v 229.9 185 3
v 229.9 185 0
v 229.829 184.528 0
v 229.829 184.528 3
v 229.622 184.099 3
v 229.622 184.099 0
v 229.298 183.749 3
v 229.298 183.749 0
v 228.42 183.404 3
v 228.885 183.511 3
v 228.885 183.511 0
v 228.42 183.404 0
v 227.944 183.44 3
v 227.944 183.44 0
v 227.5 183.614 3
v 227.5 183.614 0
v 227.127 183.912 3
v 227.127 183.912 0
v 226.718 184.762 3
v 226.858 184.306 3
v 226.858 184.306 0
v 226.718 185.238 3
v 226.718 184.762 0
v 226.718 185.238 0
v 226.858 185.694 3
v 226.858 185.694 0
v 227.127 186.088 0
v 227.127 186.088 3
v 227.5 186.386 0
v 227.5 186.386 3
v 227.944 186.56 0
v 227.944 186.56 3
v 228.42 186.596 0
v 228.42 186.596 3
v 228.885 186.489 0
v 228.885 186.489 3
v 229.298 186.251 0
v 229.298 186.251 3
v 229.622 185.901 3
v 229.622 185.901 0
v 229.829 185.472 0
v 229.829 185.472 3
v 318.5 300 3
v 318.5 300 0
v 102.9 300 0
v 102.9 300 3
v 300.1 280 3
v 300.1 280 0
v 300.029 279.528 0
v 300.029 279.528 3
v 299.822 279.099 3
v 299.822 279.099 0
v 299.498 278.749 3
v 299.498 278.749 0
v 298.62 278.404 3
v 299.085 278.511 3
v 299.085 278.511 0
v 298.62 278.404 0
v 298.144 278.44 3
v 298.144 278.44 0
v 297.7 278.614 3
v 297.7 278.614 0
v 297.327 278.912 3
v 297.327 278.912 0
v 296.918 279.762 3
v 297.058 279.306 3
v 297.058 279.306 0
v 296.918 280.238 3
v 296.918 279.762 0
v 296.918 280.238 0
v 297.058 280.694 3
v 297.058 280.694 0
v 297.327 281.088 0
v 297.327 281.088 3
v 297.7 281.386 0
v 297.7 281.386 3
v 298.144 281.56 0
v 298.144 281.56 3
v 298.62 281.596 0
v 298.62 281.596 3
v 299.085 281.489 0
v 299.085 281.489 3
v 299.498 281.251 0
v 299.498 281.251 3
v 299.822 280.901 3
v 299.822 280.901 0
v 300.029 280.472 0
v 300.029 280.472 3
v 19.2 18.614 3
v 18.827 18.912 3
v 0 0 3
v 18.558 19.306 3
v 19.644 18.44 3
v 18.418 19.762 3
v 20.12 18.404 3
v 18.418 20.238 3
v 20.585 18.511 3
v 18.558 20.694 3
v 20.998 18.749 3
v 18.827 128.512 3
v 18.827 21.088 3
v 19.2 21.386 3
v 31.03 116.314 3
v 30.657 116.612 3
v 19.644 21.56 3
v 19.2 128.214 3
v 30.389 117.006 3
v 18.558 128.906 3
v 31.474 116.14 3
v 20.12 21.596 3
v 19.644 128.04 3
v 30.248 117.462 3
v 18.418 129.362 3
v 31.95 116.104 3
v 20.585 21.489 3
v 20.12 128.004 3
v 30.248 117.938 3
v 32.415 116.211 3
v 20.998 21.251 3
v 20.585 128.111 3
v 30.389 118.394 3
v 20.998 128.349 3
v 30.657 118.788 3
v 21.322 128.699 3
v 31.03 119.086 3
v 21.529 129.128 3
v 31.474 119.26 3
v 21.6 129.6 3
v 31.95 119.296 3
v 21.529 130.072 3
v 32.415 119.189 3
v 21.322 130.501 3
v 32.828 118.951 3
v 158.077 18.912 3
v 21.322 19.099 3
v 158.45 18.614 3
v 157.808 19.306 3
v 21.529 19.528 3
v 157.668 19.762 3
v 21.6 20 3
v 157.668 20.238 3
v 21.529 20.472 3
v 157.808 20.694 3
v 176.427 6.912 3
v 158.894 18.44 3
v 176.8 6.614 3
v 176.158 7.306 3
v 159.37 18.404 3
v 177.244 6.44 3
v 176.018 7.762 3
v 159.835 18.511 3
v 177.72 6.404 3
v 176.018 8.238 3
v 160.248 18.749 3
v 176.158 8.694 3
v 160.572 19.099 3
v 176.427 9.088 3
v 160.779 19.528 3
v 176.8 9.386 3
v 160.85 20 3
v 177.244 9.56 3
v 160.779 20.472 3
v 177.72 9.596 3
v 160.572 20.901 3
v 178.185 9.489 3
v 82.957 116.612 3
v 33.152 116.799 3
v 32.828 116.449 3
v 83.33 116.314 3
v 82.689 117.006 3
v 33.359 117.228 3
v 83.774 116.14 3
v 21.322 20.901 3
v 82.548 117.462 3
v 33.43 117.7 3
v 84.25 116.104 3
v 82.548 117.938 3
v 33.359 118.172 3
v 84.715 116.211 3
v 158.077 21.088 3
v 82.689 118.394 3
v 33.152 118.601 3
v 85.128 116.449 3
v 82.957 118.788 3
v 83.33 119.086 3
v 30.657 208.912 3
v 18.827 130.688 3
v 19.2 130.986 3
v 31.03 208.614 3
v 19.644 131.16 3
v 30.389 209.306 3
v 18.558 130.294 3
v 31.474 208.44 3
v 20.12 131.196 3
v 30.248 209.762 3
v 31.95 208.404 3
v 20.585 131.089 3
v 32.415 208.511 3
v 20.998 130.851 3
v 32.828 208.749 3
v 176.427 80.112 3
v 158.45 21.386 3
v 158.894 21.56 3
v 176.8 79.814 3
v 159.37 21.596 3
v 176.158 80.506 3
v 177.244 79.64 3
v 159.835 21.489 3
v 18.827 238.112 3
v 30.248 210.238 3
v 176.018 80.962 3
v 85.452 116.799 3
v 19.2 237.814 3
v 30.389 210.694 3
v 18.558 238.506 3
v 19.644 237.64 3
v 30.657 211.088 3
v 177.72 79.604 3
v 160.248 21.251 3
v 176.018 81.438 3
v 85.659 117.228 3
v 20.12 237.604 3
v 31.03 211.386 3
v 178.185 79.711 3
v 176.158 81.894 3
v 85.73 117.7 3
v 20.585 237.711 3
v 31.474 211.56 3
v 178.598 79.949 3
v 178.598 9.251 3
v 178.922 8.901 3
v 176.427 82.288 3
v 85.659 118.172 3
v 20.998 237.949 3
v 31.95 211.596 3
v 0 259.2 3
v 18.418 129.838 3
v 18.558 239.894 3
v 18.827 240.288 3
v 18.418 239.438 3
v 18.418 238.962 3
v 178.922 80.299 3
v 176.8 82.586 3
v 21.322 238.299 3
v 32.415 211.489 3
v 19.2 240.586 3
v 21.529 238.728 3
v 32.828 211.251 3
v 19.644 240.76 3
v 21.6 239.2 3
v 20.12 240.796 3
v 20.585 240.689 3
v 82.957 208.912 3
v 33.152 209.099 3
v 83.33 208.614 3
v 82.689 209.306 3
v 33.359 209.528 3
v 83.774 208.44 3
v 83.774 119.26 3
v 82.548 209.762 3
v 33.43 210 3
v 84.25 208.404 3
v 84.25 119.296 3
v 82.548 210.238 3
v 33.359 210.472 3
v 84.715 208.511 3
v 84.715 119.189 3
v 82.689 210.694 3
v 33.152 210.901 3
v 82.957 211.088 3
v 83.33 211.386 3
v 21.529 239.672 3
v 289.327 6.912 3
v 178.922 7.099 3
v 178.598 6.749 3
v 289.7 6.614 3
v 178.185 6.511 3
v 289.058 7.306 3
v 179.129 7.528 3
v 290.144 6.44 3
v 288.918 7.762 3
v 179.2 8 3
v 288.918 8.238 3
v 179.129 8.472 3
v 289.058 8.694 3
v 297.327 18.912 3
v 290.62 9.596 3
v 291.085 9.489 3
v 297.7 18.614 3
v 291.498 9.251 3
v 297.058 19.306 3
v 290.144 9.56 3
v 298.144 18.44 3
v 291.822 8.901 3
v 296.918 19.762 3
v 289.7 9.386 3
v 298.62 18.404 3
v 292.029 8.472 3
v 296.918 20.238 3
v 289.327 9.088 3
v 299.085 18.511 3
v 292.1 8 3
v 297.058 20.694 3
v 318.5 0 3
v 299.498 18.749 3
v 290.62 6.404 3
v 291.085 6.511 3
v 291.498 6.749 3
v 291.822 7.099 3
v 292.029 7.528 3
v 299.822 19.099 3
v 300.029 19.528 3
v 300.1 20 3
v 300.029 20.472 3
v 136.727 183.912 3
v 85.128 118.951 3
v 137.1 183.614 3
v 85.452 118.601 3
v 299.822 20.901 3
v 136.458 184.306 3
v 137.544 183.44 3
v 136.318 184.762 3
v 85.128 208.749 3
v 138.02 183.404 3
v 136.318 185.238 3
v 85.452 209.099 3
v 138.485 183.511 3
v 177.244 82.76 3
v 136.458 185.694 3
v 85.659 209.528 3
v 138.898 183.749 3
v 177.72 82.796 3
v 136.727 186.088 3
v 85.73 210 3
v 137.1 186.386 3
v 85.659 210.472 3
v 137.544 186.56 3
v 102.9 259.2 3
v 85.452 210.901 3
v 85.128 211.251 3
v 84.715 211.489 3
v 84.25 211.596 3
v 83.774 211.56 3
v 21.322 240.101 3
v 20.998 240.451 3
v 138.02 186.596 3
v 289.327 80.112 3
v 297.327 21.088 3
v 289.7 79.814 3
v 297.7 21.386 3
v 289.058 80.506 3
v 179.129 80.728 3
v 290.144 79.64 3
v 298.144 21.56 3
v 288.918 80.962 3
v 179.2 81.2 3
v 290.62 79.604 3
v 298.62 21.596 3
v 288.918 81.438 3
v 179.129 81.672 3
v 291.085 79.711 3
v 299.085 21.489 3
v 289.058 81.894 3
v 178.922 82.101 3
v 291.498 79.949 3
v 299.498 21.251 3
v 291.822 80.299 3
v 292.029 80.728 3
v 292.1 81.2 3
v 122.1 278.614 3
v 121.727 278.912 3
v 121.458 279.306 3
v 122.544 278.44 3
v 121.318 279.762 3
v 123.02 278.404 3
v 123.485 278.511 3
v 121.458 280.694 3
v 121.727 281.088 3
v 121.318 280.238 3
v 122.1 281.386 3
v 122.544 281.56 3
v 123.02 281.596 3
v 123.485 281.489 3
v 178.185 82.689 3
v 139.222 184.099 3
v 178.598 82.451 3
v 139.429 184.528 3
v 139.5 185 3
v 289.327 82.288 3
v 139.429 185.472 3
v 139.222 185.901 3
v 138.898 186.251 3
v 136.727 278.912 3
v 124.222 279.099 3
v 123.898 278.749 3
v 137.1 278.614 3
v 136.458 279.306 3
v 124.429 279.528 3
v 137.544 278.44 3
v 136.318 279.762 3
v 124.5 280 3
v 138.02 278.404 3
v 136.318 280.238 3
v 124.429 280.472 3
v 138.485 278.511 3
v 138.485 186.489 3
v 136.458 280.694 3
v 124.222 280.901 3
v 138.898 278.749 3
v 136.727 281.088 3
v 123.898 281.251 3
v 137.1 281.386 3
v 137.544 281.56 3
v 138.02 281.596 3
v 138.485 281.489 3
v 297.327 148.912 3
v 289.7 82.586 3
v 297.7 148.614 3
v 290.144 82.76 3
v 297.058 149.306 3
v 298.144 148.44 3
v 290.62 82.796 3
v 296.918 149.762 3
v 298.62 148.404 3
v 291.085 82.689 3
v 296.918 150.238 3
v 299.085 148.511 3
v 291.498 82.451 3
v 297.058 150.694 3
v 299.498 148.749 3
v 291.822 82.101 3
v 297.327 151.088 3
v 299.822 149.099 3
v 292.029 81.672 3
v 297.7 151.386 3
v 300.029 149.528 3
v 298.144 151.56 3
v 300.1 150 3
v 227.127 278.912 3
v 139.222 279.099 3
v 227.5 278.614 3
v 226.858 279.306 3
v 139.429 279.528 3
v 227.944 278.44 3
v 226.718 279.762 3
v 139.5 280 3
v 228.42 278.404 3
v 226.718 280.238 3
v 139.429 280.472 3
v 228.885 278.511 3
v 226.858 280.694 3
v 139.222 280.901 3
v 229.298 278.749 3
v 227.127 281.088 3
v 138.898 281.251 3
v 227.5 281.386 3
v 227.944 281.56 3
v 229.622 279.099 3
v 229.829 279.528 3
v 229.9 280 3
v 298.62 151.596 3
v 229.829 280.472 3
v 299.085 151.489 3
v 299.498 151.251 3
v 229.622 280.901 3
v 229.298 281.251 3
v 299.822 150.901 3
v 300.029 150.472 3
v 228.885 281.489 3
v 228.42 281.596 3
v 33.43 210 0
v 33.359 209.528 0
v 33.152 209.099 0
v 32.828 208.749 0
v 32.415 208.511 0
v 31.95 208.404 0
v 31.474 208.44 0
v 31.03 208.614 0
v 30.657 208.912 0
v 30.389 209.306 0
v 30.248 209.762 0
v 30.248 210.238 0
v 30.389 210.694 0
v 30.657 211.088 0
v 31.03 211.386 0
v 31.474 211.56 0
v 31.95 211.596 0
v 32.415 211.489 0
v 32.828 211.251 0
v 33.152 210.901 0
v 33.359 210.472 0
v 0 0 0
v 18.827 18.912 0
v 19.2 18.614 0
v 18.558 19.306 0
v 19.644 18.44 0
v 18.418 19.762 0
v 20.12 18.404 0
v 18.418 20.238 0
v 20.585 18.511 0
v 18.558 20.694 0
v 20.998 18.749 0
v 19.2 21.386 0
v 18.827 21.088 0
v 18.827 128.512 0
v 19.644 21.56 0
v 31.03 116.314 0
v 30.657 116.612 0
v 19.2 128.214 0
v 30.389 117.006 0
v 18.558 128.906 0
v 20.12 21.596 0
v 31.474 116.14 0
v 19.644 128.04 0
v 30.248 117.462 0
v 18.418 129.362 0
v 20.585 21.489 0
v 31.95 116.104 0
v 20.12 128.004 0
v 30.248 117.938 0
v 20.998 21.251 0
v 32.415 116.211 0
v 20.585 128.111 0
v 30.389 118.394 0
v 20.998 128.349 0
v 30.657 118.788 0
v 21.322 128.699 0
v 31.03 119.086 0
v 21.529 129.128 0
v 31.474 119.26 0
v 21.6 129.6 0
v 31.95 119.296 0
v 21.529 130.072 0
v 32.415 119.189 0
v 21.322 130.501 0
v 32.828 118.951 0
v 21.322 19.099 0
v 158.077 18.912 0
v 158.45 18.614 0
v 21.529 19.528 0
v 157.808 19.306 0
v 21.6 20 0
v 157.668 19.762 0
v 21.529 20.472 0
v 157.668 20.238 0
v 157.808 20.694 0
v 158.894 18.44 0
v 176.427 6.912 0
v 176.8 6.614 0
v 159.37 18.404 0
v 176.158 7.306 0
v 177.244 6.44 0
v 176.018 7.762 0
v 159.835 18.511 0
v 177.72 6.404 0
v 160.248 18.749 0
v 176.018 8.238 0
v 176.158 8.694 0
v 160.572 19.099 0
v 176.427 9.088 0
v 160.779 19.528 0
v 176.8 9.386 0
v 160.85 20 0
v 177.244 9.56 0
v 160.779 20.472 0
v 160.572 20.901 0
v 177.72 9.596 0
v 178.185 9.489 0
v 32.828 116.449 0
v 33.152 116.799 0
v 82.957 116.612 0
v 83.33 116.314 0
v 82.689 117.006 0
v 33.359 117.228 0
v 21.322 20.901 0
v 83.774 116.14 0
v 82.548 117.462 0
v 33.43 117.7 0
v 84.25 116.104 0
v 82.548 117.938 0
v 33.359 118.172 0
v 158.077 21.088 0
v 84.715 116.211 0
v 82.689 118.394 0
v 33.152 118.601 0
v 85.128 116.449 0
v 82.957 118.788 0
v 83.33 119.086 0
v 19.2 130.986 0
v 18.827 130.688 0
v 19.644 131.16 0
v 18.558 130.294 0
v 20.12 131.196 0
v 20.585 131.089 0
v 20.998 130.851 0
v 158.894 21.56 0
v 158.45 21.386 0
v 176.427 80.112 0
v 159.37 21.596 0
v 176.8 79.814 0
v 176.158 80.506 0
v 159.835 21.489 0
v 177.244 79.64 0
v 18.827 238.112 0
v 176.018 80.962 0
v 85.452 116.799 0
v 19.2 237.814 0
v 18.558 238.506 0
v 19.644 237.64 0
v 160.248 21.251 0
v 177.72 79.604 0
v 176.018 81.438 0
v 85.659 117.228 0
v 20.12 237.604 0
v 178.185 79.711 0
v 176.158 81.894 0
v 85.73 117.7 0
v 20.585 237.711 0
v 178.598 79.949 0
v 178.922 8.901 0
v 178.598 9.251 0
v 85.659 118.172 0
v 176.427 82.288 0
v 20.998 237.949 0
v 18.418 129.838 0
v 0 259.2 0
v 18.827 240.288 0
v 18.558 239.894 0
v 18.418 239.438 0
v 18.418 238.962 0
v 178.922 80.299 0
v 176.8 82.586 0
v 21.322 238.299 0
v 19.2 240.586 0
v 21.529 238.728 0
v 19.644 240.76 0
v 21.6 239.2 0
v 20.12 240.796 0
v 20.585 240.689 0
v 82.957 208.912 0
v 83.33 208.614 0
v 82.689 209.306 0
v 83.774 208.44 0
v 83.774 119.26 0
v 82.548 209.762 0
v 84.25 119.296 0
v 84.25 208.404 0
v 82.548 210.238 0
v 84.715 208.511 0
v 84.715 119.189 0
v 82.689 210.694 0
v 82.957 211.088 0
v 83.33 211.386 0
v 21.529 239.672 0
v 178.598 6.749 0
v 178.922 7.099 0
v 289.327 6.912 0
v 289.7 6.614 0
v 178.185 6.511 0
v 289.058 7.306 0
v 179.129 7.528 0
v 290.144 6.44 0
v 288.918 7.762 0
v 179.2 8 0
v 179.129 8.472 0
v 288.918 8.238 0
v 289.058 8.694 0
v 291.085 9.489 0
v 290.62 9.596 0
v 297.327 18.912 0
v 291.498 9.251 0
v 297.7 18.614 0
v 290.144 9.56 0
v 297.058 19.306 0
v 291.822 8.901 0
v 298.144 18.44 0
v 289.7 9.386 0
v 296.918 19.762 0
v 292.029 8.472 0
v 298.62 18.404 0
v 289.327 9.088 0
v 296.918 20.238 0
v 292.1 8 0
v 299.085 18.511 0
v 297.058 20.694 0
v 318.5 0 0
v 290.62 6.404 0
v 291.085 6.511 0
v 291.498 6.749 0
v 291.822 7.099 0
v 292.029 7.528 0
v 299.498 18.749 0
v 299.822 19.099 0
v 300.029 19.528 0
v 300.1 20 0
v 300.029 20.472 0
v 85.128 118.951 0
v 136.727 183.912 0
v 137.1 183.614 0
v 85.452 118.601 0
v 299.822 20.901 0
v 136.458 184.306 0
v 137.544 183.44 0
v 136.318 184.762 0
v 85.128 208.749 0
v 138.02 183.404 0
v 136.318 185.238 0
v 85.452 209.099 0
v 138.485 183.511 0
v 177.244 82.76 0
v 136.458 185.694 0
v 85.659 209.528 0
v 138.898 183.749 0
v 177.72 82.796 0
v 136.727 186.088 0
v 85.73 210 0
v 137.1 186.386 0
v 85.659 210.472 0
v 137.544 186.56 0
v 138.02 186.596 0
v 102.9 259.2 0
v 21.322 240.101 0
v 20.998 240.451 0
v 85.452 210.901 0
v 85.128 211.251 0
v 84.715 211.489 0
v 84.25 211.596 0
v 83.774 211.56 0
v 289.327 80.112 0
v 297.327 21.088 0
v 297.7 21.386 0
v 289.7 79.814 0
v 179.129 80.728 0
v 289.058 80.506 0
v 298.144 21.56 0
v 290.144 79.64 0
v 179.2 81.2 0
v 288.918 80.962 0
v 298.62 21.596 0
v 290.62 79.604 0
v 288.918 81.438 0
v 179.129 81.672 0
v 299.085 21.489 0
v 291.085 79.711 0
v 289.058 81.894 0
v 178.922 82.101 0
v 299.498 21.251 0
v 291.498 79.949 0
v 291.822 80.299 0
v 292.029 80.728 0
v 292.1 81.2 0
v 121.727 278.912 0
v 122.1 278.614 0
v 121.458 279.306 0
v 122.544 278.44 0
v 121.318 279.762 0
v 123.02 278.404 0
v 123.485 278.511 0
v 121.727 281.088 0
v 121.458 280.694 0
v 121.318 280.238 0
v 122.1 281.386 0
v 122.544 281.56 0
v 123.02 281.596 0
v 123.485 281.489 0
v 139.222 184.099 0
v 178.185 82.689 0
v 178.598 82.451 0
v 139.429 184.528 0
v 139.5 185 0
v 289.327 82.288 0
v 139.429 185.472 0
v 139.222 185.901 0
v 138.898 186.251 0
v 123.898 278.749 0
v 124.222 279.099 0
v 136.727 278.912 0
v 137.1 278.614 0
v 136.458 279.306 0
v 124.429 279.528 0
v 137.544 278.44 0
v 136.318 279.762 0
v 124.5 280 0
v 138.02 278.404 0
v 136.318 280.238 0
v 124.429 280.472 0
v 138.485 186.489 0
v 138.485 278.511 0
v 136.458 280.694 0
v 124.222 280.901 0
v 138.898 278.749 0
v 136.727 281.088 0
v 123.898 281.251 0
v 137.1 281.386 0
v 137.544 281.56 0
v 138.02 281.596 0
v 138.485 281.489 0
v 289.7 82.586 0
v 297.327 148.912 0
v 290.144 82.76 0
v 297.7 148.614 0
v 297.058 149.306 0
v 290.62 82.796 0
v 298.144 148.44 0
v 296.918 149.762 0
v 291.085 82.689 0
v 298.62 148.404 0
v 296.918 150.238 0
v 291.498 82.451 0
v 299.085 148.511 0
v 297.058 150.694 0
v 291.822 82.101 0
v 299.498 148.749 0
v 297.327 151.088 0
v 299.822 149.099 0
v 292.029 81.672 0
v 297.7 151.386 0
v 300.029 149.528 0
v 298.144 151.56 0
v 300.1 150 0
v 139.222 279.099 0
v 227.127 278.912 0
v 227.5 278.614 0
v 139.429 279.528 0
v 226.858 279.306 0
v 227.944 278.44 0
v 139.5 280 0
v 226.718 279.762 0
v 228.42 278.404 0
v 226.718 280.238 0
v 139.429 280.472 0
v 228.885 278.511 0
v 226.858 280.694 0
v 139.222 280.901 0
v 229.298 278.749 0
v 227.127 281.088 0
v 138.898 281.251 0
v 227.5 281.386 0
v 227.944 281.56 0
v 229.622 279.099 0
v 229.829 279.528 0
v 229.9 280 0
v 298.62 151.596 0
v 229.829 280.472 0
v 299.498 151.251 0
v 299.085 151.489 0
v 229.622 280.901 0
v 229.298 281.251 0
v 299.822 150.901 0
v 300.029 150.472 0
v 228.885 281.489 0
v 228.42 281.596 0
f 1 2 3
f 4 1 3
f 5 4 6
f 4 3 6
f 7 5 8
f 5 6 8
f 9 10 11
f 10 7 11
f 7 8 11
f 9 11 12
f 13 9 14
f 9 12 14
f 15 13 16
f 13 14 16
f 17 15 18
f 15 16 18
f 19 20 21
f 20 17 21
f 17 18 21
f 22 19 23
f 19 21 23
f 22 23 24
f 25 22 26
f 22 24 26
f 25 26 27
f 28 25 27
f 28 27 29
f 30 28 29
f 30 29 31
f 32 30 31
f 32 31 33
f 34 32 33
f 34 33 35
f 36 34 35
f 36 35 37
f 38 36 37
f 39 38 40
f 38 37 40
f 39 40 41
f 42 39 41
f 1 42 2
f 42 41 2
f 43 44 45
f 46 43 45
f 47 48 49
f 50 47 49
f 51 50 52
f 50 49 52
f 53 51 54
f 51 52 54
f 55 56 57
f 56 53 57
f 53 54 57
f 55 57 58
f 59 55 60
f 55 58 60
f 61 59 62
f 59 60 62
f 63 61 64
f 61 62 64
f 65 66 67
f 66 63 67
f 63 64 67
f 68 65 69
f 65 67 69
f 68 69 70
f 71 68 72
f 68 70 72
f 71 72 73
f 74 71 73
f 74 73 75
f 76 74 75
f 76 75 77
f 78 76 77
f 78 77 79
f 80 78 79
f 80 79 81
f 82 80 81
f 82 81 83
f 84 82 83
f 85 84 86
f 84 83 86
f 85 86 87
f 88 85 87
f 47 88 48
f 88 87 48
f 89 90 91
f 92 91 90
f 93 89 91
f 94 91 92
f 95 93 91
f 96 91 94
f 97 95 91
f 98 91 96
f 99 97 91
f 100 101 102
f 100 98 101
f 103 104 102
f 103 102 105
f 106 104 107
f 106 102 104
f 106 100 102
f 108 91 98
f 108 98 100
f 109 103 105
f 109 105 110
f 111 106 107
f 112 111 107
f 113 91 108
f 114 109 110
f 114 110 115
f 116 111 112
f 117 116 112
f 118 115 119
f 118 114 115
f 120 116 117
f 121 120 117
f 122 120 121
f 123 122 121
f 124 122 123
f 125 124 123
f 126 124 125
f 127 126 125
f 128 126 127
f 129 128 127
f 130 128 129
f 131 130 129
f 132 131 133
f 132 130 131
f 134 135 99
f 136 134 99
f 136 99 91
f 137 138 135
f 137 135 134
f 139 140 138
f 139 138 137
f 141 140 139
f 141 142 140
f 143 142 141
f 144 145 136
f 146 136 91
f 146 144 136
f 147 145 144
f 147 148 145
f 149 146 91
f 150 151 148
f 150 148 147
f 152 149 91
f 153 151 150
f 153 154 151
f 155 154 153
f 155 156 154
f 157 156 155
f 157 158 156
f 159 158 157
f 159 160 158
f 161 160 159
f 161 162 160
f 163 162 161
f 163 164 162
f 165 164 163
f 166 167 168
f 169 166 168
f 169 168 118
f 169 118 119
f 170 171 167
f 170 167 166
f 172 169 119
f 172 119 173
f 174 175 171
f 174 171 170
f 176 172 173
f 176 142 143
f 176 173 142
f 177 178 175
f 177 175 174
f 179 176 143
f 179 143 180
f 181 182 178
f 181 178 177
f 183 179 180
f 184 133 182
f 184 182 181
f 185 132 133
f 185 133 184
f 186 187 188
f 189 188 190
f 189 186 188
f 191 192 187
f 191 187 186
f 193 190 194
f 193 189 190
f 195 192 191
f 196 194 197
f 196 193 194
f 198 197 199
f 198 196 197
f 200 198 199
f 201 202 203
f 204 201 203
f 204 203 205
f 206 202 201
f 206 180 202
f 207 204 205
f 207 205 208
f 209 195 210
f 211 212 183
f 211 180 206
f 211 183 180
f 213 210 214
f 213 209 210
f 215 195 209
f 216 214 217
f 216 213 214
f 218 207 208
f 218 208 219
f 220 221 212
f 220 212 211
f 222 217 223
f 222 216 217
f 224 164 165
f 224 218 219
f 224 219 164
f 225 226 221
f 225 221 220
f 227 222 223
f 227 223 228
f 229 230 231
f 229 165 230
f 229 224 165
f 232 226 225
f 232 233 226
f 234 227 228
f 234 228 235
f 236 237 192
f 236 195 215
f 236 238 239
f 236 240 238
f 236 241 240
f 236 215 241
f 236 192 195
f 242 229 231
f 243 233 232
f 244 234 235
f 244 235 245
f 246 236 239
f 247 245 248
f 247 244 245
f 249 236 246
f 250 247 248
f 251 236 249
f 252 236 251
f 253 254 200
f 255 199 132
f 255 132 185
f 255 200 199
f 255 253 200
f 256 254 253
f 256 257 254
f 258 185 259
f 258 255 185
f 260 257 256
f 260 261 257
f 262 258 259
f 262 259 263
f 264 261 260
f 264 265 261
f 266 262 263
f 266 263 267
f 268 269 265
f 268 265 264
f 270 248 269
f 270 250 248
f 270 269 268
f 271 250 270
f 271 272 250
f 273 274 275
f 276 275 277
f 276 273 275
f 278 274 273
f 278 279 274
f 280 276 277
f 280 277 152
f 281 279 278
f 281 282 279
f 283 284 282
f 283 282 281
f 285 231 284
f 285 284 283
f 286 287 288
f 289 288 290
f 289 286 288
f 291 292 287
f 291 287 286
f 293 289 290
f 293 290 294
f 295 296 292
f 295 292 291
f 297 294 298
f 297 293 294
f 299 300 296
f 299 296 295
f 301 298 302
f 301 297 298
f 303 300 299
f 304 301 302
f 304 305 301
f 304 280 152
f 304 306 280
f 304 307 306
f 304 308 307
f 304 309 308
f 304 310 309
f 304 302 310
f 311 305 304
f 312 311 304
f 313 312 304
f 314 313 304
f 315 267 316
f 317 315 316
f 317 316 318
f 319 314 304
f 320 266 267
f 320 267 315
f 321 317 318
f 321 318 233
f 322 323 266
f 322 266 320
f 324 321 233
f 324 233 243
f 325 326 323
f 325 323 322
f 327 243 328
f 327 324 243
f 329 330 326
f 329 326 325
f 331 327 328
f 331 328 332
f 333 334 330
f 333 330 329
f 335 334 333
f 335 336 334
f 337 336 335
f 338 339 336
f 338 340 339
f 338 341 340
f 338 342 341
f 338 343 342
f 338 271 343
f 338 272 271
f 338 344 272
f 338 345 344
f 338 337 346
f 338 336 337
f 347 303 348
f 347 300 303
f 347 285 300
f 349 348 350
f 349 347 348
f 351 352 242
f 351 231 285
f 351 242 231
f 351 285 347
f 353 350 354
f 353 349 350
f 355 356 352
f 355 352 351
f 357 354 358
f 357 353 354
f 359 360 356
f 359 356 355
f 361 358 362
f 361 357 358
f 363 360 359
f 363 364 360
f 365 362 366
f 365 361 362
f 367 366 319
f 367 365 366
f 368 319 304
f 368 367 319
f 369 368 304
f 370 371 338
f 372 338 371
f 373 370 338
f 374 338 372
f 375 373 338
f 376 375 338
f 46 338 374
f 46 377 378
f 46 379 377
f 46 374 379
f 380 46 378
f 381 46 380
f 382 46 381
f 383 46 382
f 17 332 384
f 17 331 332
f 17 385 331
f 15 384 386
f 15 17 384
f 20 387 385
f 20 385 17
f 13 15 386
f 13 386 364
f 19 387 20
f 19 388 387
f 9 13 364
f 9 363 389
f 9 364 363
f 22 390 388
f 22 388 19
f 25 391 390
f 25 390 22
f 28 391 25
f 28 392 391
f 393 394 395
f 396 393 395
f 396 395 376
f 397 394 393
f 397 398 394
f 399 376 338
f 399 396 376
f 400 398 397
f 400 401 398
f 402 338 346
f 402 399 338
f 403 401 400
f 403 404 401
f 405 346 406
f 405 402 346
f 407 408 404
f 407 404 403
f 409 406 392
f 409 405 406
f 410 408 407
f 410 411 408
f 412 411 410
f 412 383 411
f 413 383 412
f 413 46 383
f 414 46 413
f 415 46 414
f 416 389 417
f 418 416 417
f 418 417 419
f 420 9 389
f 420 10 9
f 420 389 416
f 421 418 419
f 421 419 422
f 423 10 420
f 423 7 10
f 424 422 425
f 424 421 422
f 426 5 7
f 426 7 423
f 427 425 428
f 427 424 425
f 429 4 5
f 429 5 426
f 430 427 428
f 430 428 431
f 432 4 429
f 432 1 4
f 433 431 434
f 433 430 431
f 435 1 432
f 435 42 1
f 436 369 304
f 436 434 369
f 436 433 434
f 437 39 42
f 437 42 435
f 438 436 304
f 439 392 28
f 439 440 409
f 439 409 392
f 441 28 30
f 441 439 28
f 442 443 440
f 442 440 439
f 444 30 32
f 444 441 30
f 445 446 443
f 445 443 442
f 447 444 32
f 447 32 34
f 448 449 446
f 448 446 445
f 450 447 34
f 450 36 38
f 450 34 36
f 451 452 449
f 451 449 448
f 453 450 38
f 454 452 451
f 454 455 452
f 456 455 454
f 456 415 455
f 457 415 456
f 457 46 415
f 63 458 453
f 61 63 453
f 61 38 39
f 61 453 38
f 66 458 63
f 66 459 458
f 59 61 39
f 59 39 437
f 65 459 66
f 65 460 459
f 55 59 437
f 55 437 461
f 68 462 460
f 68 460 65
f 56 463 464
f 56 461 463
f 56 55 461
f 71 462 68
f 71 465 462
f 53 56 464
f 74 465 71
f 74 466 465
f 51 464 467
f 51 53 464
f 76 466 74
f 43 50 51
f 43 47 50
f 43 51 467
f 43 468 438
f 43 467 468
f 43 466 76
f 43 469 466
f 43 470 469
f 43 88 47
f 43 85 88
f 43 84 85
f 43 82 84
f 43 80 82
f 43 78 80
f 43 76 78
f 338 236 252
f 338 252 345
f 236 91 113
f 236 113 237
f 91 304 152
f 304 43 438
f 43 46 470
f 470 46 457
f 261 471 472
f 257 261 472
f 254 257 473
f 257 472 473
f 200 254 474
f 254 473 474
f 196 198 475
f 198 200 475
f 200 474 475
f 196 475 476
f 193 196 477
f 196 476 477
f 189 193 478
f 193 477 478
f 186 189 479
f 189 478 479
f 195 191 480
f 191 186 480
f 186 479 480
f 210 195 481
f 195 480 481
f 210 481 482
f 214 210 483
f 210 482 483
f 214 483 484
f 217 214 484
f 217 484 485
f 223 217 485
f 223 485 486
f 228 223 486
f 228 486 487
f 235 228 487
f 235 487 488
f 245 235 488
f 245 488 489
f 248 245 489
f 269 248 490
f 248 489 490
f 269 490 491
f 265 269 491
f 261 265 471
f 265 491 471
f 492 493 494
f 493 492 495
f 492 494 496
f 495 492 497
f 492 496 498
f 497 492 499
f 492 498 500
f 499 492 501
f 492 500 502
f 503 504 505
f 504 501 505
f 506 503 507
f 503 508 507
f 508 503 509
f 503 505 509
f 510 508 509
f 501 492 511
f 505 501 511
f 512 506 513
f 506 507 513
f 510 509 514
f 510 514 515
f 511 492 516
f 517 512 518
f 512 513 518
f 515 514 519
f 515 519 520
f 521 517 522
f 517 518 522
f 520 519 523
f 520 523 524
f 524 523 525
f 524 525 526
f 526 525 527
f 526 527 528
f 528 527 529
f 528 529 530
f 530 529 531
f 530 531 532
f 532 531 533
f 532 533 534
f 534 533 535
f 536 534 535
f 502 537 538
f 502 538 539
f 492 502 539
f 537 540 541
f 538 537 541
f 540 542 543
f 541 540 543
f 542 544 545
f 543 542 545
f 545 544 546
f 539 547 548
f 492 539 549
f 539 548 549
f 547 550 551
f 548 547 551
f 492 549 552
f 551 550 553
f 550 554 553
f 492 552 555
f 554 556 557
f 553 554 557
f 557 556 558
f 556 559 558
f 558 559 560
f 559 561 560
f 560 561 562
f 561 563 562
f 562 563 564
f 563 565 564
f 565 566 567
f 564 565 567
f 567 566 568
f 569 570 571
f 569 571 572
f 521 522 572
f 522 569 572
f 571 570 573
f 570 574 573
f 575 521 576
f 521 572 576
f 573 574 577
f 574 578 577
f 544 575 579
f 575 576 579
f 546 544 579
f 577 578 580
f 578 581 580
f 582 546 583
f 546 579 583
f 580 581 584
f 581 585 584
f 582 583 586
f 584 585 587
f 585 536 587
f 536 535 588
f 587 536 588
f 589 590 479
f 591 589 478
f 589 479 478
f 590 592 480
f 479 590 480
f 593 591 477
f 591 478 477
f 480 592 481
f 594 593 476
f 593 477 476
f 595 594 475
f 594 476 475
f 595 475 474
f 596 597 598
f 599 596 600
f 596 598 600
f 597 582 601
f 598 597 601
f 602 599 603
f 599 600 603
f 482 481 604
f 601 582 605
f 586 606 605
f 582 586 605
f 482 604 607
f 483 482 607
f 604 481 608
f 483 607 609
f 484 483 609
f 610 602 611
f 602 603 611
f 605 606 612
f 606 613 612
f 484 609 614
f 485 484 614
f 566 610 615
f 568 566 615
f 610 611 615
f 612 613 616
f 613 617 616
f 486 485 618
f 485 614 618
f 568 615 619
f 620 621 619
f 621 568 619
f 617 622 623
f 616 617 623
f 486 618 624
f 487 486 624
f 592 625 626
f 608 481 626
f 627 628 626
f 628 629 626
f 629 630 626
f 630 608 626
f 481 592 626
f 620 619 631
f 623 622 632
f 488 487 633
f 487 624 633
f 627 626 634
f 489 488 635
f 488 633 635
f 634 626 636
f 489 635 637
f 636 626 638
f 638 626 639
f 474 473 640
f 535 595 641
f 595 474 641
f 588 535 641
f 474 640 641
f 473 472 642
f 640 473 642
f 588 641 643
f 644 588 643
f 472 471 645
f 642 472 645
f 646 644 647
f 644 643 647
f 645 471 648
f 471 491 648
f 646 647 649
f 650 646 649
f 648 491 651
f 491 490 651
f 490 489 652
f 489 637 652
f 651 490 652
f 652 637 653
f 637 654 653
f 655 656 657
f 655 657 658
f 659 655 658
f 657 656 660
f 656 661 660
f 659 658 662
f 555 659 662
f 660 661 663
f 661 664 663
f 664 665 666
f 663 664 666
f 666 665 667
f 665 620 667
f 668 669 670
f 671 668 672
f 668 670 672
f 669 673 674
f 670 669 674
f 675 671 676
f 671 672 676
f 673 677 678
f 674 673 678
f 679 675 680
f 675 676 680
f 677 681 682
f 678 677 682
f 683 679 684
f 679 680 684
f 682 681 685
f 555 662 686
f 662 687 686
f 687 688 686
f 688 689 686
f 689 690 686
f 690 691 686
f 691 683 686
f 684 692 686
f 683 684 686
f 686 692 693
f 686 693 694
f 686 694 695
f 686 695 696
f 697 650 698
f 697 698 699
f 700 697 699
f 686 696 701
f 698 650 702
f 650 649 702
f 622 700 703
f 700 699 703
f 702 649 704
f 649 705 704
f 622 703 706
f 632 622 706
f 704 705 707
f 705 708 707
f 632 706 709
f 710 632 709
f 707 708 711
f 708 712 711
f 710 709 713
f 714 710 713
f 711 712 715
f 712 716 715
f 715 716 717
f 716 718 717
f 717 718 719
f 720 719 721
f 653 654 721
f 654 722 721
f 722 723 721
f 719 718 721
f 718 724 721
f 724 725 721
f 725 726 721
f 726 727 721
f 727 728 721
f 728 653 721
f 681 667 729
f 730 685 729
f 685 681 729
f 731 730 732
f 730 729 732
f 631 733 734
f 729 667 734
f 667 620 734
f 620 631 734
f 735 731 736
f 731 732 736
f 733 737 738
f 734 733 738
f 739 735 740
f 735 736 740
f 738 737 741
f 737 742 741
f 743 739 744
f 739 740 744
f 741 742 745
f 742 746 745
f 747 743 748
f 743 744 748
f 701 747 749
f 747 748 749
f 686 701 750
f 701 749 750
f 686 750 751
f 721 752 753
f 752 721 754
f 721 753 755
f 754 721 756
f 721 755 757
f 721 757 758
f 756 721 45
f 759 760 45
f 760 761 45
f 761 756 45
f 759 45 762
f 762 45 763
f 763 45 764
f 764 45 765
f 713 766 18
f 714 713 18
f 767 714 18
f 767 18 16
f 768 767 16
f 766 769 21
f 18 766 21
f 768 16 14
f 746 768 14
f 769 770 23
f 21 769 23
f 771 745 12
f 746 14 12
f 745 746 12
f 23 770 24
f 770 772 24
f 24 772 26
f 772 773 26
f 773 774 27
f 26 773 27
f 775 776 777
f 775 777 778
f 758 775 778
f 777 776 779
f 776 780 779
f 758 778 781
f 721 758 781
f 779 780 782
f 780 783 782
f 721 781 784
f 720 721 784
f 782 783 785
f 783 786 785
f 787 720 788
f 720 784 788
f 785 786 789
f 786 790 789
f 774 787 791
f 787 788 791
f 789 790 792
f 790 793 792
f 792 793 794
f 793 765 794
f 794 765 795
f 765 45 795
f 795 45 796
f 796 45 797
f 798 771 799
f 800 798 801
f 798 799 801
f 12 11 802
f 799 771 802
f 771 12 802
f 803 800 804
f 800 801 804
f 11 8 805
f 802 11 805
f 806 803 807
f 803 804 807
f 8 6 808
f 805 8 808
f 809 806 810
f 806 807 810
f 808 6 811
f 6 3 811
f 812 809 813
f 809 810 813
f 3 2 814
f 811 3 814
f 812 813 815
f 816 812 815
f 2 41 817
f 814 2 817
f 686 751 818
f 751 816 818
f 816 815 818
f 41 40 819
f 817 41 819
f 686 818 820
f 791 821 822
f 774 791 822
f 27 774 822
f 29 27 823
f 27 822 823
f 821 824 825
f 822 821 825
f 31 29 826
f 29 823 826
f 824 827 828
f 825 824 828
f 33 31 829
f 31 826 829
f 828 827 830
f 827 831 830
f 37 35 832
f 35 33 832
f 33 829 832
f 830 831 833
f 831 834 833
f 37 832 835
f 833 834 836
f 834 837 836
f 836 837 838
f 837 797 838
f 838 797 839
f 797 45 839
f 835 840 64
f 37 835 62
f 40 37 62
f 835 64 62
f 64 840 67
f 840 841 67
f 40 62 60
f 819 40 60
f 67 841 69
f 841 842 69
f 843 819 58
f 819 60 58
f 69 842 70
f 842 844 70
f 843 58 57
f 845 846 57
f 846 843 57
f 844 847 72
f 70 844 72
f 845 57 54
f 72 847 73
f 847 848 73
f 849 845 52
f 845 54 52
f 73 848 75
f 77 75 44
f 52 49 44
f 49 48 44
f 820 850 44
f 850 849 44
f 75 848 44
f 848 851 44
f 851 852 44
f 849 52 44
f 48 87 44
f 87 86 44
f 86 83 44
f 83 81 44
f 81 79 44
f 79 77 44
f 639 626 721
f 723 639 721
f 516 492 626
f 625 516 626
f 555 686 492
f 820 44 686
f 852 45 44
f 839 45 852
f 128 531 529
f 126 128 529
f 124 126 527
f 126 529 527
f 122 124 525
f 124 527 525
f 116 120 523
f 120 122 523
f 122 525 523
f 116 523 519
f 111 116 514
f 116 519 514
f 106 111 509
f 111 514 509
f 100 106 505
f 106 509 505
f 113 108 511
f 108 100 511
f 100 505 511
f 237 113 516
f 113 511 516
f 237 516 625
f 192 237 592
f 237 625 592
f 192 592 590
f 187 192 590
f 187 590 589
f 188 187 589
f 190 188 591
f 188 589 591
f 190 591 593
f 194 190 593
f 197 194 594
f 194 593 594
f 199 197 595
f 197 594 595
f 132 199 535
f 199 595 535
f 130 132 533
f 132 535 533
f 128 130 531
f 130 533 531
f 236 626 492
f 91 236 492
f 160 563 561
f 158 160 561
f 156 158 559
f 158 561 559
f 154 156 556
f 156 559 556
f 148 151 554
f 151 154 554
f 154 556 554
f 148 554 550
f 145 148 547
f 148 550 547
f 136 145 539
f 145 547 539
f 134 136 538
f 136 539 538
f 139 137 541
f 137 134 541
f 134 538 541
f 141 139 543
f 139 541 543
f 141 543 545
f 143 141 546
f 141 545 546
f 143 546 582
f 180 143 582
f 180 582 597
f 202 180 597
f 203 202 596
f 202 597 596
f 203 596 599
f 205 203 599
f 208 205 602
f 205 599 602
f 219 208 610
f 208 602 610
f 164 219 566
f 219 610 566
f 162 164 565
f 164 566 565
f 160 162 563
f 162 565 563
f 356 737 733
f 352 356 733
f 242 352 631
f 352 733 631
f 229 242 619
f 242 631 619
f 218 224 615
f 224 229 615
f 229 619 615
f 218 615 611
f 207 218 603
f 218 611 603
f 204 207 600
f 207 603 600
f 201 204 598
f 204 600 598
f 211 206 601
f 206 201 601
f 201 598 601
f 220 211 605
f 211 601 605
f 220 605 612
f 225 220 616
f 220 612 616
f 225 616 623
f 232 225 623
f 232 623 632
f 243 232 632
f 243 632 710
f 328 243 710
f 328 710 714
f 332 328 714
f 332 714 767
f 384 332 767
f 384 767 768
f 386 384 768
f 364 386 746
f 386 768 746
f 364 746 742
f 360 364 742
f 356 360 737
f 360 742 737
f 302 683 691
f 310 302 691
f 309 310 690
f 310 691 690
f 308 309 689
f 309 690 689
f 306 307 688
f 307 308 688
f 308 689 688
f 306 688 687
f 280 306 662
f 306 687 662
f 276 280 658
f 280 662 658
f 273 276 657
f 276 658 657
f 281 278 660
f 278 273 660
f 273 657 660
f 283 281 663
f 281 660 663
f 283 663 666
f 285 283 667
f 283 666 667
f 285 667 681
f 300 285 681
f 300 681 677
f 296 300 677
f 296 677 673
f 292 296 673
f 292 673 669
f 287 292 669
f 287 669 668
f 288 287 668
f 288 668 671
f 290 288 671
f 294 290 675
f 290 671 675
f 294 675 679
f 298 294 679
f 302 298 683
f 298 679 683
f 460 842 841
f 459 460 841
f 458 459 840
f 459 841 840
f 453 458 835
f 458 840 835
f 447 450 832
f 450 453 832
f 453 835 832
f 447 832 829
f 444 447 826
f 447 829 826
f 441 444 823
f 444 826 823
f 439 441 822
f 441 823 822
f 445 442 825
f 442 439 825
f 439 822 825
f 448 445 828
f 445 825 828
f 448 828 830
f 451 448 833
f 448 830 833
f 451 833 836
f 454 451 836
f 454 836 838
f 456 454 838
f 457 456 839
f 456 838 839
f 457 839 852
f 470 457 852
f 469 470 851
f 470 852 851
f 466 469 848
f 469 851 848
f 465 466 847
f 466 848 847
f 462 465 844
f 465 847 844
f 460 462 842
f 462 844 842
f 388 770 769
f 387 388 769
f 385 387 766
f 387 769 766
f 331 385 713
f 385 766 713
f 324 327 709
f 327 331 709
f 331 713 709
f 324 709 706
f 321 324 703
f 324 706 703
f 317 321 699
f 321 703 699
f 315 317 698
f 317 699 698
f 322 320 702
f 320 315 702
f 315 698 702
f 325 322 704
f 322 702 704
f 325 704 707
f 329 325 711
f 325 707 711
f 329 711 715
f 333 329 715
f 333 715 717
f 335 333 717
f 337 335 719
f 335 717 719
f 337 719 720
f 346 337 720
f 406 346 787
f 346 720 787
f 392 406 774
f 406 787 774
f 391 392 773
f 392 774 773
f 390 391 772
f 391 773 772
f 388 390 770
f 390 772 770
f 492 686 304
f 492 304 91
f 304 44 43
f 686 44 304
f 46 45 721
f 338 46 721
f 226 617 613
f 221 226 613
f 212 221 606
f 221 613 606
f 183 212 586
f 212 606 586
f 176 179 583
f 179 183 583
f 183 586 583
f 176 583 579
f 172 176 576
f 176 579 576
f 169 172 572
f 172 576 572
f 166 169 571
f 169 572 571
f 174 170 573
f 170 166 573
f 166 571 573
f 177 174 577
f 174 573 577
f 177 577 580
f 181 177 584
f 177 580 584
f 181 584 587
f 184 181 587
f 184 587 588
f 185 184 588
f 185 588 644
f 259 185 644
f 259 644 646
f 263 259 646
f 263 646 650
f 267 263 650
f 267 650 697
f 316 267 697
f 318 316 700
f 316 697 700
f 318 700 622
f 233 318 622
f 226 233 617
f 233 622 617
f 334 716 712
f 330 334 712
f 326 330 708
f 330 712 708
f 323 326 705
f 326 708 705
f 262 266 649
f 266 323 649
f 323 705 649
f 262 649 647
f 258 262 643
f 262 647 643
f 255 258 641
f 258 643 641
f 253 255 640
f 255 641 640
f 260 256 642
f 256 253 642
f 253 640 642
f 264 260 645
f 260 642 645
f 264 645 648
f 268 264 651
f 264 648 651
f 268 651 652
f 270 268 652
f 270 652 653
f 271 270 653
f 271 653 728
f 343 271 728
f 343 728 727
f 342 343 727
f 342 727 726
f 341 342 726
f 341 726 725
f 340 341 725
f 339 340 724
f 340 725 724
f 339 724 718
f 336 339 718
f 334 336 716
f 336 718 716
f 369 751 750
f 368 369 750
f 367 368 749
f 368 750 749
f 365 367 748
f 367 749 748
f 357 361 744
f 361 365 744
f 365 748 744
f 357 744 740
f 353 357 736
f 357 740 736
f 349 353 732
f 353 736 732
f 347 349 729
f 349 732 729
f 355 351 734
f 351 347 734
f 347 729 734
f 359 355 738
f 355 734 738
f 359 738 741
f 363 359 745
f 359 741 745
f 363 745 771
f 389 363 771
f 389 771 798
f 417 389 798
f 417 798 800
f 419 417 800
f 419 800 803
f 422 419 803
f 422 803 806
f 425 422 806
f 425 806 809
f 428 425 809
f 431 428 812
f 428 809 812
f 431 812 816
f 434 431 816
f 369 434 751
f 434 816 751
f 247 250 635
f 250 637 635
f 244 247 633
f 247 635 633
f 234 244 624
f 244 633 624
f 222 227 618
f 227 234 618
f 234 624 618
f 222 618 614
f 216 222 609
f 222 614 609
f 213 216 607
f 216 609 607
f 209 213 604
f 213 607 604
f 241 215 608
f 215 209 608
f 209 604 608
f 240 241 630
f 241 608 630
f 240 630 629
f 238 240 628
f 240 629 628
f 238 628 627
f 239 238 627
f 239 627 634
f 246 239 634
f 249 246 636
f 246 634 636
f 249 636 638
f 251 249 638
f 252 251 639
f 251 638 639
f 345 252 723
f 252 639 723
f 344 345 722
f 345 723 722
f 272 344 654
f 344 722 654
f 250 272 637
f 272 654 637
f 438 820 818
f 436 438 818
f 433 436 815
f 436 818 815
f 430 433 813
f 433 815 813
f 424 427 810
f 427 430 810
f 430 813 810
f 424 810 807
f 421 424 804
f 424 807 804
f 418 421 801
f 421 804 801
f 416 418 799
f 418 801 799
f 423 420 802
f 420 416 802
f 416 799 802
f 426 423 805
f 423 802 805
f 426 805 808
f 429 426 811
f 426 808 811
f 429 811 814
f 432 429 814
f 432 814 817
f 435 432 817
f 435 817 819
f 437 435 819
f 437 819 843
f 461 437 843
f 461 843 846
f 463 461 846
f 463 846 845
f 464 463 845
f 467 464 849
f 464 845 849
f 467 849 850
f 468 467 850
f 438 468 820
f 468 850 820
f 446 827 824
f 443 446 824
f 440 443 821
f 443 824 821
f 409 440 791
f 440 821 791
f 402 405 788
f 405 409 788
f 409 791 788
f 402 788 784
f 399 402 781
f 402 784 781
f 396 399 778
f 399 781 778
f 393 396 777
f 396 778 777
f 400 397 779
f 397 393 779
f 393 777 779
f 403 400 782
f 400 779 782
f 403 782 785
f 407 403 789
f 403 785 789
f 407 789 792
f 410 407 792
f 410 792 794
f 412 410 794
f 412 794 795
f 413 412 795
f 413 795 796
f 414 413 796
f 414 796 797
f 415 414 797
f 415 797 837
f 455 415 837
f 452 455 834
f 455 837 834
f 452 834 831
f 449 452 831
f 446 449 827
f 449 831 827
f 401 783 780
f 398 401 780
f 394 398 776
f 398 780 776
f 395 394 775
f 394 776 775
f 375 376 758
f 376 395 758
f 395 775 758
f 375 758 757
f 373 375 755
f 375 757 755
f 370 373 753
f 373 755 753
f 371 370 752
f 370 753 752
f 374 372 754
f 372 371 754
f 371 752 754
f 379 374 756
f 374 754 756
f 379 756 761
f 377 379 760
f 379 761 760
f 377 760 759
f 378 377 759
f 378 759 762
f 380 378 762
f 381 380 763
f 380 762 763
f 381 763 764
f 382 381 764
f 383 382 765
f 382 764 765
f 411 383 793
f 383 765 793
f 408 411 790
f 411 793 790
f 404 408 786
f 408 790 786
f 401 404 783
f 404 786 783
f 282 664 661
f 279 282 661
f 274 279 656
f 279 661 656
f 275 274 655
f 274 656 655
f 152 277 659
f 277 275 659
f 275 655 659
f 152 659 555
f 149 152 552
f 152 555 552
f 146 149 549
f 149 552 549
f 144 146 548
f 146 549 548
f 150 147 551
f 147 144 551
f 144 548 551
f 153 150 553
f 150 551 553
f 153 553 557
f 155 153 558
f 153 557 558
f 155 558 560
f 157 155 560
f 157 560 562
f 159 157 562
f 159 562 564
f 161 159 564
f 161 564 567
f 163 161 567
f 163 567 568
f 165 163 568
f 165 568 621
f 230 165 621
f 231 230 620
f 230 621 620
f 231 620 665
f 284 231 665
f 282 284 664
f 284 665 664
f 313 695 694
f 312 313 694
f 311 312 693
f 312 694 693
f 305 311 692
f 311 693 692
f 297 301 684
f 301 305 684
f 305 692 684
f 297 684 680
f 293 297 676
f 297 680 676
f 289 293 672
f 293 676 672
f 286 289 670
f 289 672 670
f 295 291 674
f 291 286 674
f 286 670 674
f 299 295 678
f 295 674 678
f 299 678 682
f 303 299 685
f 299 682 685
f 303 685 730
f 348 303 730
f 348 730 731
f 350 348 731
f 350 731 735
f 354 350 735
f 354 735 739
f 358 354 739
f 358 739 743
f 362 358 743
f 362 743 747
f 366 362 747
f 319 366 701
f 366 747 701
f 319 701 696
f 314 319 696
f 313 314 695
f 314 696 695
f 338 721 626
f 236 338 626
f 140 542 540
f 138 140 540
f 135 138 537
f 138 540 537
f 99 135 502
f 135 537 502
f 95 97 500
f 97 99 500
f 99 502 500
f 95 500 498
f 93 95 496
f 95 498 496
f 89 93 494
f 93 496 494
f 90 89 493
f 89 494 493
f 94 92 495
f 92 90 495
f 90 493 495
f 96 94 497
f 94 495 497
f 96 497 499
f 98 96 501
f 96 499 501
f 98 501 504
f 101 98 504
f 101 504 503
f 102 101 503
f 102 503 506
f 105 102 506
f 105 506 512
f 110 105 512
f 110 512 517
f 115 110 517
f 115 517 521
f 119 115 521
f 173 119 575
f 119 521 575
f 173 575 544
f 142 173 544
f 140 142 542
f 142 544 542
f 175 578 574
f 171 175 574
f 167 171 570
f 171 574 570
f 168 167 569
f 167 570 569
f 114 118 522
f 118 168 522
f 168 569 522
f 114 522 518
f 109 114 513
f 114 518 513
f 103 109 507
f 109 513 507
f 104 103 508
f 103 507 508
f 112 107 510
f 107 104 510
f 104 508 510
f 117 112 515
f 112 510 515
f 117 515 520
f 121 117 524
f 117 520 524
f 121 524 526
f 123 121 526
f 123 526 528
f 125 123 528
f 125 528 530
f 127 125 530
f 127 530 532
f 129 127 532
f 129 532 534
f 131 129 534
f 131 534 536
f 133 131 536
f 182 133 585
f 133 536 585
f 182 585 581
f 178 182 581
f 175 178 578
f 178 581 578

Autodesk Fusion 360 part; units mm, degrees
sketch "Sketch1" plane through (0, 0, 0) normal (0, 0, 1) x (1, 0, 0)
  line L0 (102.9, 300) -> (102.9, 259.2)
  line L1 (318.5, 0) -> (0, 0)
  line L2 (102.9, 259.2) -> (0, 259.2)
  line L3 (318.5, 300) -> (102.9, 300)
  line L4 (318.5, 300) -> (318.5, 0)
  line L5 (0, 259.2) -> (0, 0)
  circle A0 centre (298.5, 280) radius 1.6
  circle A1 centre (122.9, 280) radius 1.6
  circle A2 centre (298.5, 20) radius 1.6
  circle A3 centre (20, 239.2) radius 1.6
  circle A4 centre (20, 20) radius 1.6
  circle A5 centre (20, 129.6) radius 1.6
  circle A6 centre (298.5, 150) radius 1.6
  circle A7 centre (159.25, 20) radius 1.6
  circle A8 centre (137.9, 280) radius 1.6
  line L6 (137.9, 280) -> (228.3, 280) construction
  circle A9 centre (228.3, 280) radius 1.6
  line L7 (137.9, 280) -> (137.9, 185) construction
  circle A10 centre (137.9, 185) radius 1.6
  line L8 (137.9, 185) -> (228.3, 185) construction
  circle A11 centre (228.3, 185) radius 1.6
  circle A12 centre (31.8301, 210) radius 1.6
  line L9 (31.8301, 210) -> (84.1301, 210) construction
  circle A13 centre (84.1301, 210) radius 1.6
  line L10 (31.8301, 210) -> (31.8301, 117.7) construction
  circle A14 centre (31.8301, 117.7) radius 1.6
  line L11 (84.1301, 210) -> (84.1301, 117.7) construction
  circle A15 centre (84.1301, 117.7) radius 1.6
  circle A16 centre (290.5, 8) radius 1.6
  line L12 (290.5, 8) -> (290.5, 81.2) construction
  circle A17 centre (290.5, 81.2) radius 1.6
  line L13 (290.5, 8) -> (177.6, 8) construction
  circle A18 centre (177.6, 8) radius 1.6
  line L14 (177.6, 8) -> (177.6, 81.2) construction
  circle A19 centre (177.6, 81.2) radius 1.6
  dimension "d3" = 318.5
  dimension "d4" = 300
  dimension "d5" = 40.8
  dimension "d6" = 102.9
  dimension "d9" = 3.2
  dimension "d10" = 20
  dimension "d11" = 20
  dimension "d12" = 3.2
  dimension "d13" = 20
  dimension "d14" = 20
  dimension "d15" = 3.2
  dimension "d16" = 20
  dimension "d17" = 20
  dimension "d18" = 3.2
  dimension "d19" = 20
  dimension "d20" = 20
  dimension "d21" = 3.2
  dimension "d22" = 20
  dimension "d23" = 20
  dimension "d24" = 3.2
  dimension "d25" = 20
  dimension "d26" = 109.6
  dimension "d27" = 3.2
  dimension "d28" = 20
  dimension "d29" = 130
  dimension "d30" = 3.2
  dimension "d31" = 20
  dimension "d32" = 159.25
  dimension "d33" = 3.2
  dimension "d36" = 90.4
  dimension "d37" = 3.2
  dimension "d38" = 95
  dimension "d39" = 3.2
  dimension "d40" = 90.4
  dimension "d41" = 3.2
  dimension "d42" = 3.2
  dimension "d43" = 52.3
  dimension "d44" = 3.2
  dimension "d45" = 92.3
  dimension "d46" = 3.2
  dimension "d47" = 92.3
  dimension "d48" = 3.2
  dimension "d49" = 35
  dimension "d50" = 20
  dimension "d51" = 3.2
  dimension "d52" = 8
  dimension "d53" = 8
  dimension "d54" = 73.2
  dimension "d55" = 3.2
  dimension "d56" = 112.9
  dimension "d57" = 3.2
  dimension "d58" = 73.2
  dimension "d59" = 3.2
extrude "Extrude1" add sketch "Sketch1" along normal blind 3
sketch "Mounting plate laser cut" plane through (0, 0, 3) normal (0, 0, 1) x (-1, 0, 0)
  circle A0 centre (-20, -129.6) radius 1.6
  circle A1 centre (-298.5, -280) radius 1.6
  circle A2 centre (-298.5, -20) radius 1.6
  circle A3 centre (-159.25, -20) radius 1.6
  circle A4 centre (-137.9, -280) radius 1.6
  circle A5 centre (-228.3, -280) radius 1.6
  circle A6 centre (-298.5, -150) radius 1.6
  circle A7 centre (-137.9, -185) radius 1.6
  circle A8 centre (-177.6, -8) radius 1.6
  circle A9 centre (-20, -239.2) radius 1.6
  circle A10 centre (-290.5, -8) radius 1.6
  circle A11 centre (-228.3, -185) radius 1.6
  circle A12 centre (-177.6, -81.2) radius 1.6
  circle A13 centre (-31.8301, -117.7) radius 1.6
  circle A14 centre (-290.5, -81.2) radius 1.6
  circle A15 centre (-84.1301, -117.7) radius 1.6
  circle A16 centre (-122.9, -280) radius 1.6
  circle A17 centre (-31.8301, -210) radius 1.6
  circle A18 centre (-84.1301, -210) radius 1.6
  circle A19 centre (-20, -20) radius 1.6
  line L0 (-318.5, -300) -> (-102.9, -300)
  line L1 (-102.9, -300) -> (-102.9, -259.2)
  line L2 (-102.9, -259.2) -> (0, -259.2)
  line L3 (0, -259.2) -> (0, 0)
  line L4 (0, 0) -> (-318.5, 0)
  line L5 (-318.5, 0) -> (-318.5, -300)
equation "d26 = ( 219.2 / 2 ) * 1 mm"
equation "d29 = ( 260 / 2 ) * 1 mm"
equation "d32 = ( 318.5 / 2 ) * 1 mm"
